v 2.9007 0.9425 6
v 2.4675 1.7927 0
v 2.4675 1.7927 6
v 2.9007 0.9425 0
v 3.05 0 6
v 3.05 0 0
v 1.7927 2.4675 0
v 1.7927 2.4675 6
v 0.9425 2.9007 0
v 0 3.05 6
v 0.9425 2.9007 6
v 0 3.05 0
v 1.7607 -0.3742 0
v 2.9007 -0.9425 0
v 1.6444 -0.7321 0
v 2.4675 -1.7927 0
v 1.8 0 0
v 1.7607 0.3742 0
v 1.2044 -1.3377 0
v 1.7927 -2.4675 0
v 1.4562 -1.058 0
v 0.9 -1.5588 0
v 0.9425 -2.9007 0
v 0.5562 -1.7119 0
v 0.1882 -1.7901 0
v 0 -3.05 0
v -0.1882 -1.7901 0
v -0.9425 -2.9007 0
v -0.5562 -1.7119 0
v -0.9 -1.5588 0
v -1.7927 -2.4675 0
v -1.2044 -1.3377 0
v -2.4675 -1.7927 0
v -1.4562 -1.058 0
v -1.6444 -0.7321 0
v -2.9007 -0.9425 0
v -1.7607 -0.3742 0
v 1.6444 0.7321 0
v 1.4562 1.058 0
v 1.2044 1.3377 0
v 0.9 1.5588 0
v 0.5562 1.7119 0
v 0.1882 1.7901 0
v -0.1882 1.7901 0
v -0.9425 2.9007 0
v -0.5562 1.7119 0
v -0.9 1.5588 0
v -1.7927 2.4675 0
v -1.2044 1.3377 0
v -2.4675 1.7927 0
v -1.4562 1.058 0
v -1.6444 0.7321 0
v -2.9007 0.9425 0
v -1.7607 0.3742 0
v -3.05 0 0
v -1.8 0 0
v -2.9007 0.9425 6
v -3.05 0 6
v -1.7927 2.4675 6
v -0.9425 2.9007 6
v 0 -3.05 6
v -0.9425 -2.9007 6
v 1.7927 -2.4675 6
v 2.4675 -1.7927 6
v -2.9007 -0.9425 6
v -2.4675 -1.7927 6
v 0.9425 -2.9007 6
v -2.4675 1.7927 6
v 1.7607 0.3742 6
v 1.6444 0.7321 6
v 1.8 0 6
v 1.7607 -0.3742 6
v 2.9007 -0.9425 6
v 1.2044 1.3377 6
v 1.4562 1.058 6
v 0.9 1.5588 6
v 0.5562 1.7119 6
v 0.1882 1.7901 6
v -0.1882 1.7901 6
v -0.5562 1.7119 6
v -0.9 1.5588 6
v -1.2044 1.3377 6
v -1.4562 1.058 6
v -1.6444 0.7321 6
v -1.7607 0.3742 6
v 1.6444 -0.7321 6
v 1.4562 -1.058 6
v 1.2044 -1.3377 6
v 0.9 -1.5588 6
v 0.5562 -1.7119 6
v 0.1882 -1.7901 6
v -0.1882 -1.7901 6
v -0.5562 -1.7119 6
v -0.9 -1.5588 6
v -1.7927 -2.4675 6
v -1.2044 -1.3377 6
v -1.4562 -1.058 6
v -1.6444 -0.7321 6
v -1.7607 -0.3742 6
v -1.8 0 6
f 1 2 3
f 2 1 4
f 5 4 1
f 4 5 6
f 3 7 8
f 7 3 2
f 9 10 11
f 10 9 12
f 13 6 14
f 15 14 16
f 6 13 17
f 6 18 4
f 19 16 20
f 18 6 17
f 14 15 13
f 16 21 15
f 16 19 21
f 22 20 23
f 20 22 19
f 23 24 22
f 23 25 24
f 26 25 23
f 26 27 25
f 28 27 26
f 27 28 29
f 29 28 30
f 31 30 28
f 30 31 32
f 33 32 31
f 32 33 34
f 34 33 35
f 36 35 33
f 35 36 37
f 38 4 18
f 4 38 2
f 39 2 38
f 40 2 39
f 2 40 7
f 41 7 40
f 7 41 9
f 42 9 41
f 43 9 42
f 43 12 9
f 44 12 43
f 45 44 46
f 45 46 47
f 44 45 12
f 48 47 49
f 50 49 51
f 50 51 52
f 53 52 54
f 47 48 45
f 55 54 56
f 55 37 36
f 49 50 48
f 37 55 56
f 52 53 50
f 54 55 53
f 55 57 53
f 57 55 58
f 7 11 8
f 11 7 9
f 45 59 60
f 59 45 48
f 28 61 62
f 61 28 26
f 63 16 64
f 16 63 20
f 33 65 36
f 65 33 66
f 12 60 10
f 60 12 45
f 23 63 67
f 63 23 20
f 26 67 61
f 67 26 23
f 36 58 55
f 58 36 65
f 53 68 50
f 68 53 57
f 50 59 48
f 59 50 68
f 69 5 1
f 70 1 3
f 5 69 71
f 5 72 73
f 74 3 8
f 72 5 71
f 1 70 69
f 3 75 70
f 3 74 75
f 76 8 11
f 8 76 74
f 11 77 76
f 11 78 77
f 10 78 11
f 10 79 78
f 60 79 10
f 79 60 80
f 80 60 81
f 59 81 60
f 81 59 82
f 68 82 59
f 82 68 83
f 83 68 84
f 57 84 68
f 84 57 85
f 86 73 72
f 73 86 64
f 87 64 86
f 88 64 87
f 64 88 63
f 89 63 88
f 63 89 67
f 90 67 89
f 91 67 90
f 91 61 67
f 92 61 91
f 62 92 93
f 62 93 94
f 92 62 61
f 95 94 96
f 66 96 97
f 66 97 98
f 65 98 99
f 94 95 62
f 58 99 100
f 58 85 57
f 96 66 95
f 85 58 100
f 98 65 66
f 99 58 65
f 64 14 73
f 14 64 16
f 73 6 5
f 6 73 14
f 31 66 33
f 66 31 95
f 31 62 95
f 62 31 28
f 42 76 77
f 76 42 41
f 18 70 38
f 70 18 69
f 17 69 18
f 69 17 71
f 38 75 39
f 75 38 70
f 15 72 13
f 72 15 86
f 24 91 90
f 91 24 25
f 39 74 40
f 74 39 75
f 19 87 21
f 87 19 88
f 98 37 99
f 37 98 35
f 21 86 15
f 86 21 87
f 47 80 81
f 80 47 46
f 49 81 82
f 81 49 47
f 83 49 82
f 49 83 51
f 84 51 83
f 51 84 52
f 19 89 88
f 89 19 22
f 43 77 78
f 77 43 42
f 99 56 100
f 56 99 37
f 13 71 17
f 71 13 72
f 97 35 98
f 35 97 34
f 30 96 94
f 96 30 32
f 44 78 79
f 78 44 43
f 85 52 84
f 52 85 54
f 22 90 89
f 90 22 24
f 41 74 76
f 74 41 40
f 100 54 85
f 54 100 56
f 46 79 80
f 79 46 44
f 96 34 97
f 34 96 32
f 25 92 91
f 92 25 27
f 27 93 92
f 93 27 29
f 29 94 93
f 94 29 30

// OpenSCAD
difference(){
  cylinder(d=6.1, h=6.0, $fn=20);
  translate([0,0,-1])
    cylinder(d=3.6, h=8.0, $fn=30);
}
